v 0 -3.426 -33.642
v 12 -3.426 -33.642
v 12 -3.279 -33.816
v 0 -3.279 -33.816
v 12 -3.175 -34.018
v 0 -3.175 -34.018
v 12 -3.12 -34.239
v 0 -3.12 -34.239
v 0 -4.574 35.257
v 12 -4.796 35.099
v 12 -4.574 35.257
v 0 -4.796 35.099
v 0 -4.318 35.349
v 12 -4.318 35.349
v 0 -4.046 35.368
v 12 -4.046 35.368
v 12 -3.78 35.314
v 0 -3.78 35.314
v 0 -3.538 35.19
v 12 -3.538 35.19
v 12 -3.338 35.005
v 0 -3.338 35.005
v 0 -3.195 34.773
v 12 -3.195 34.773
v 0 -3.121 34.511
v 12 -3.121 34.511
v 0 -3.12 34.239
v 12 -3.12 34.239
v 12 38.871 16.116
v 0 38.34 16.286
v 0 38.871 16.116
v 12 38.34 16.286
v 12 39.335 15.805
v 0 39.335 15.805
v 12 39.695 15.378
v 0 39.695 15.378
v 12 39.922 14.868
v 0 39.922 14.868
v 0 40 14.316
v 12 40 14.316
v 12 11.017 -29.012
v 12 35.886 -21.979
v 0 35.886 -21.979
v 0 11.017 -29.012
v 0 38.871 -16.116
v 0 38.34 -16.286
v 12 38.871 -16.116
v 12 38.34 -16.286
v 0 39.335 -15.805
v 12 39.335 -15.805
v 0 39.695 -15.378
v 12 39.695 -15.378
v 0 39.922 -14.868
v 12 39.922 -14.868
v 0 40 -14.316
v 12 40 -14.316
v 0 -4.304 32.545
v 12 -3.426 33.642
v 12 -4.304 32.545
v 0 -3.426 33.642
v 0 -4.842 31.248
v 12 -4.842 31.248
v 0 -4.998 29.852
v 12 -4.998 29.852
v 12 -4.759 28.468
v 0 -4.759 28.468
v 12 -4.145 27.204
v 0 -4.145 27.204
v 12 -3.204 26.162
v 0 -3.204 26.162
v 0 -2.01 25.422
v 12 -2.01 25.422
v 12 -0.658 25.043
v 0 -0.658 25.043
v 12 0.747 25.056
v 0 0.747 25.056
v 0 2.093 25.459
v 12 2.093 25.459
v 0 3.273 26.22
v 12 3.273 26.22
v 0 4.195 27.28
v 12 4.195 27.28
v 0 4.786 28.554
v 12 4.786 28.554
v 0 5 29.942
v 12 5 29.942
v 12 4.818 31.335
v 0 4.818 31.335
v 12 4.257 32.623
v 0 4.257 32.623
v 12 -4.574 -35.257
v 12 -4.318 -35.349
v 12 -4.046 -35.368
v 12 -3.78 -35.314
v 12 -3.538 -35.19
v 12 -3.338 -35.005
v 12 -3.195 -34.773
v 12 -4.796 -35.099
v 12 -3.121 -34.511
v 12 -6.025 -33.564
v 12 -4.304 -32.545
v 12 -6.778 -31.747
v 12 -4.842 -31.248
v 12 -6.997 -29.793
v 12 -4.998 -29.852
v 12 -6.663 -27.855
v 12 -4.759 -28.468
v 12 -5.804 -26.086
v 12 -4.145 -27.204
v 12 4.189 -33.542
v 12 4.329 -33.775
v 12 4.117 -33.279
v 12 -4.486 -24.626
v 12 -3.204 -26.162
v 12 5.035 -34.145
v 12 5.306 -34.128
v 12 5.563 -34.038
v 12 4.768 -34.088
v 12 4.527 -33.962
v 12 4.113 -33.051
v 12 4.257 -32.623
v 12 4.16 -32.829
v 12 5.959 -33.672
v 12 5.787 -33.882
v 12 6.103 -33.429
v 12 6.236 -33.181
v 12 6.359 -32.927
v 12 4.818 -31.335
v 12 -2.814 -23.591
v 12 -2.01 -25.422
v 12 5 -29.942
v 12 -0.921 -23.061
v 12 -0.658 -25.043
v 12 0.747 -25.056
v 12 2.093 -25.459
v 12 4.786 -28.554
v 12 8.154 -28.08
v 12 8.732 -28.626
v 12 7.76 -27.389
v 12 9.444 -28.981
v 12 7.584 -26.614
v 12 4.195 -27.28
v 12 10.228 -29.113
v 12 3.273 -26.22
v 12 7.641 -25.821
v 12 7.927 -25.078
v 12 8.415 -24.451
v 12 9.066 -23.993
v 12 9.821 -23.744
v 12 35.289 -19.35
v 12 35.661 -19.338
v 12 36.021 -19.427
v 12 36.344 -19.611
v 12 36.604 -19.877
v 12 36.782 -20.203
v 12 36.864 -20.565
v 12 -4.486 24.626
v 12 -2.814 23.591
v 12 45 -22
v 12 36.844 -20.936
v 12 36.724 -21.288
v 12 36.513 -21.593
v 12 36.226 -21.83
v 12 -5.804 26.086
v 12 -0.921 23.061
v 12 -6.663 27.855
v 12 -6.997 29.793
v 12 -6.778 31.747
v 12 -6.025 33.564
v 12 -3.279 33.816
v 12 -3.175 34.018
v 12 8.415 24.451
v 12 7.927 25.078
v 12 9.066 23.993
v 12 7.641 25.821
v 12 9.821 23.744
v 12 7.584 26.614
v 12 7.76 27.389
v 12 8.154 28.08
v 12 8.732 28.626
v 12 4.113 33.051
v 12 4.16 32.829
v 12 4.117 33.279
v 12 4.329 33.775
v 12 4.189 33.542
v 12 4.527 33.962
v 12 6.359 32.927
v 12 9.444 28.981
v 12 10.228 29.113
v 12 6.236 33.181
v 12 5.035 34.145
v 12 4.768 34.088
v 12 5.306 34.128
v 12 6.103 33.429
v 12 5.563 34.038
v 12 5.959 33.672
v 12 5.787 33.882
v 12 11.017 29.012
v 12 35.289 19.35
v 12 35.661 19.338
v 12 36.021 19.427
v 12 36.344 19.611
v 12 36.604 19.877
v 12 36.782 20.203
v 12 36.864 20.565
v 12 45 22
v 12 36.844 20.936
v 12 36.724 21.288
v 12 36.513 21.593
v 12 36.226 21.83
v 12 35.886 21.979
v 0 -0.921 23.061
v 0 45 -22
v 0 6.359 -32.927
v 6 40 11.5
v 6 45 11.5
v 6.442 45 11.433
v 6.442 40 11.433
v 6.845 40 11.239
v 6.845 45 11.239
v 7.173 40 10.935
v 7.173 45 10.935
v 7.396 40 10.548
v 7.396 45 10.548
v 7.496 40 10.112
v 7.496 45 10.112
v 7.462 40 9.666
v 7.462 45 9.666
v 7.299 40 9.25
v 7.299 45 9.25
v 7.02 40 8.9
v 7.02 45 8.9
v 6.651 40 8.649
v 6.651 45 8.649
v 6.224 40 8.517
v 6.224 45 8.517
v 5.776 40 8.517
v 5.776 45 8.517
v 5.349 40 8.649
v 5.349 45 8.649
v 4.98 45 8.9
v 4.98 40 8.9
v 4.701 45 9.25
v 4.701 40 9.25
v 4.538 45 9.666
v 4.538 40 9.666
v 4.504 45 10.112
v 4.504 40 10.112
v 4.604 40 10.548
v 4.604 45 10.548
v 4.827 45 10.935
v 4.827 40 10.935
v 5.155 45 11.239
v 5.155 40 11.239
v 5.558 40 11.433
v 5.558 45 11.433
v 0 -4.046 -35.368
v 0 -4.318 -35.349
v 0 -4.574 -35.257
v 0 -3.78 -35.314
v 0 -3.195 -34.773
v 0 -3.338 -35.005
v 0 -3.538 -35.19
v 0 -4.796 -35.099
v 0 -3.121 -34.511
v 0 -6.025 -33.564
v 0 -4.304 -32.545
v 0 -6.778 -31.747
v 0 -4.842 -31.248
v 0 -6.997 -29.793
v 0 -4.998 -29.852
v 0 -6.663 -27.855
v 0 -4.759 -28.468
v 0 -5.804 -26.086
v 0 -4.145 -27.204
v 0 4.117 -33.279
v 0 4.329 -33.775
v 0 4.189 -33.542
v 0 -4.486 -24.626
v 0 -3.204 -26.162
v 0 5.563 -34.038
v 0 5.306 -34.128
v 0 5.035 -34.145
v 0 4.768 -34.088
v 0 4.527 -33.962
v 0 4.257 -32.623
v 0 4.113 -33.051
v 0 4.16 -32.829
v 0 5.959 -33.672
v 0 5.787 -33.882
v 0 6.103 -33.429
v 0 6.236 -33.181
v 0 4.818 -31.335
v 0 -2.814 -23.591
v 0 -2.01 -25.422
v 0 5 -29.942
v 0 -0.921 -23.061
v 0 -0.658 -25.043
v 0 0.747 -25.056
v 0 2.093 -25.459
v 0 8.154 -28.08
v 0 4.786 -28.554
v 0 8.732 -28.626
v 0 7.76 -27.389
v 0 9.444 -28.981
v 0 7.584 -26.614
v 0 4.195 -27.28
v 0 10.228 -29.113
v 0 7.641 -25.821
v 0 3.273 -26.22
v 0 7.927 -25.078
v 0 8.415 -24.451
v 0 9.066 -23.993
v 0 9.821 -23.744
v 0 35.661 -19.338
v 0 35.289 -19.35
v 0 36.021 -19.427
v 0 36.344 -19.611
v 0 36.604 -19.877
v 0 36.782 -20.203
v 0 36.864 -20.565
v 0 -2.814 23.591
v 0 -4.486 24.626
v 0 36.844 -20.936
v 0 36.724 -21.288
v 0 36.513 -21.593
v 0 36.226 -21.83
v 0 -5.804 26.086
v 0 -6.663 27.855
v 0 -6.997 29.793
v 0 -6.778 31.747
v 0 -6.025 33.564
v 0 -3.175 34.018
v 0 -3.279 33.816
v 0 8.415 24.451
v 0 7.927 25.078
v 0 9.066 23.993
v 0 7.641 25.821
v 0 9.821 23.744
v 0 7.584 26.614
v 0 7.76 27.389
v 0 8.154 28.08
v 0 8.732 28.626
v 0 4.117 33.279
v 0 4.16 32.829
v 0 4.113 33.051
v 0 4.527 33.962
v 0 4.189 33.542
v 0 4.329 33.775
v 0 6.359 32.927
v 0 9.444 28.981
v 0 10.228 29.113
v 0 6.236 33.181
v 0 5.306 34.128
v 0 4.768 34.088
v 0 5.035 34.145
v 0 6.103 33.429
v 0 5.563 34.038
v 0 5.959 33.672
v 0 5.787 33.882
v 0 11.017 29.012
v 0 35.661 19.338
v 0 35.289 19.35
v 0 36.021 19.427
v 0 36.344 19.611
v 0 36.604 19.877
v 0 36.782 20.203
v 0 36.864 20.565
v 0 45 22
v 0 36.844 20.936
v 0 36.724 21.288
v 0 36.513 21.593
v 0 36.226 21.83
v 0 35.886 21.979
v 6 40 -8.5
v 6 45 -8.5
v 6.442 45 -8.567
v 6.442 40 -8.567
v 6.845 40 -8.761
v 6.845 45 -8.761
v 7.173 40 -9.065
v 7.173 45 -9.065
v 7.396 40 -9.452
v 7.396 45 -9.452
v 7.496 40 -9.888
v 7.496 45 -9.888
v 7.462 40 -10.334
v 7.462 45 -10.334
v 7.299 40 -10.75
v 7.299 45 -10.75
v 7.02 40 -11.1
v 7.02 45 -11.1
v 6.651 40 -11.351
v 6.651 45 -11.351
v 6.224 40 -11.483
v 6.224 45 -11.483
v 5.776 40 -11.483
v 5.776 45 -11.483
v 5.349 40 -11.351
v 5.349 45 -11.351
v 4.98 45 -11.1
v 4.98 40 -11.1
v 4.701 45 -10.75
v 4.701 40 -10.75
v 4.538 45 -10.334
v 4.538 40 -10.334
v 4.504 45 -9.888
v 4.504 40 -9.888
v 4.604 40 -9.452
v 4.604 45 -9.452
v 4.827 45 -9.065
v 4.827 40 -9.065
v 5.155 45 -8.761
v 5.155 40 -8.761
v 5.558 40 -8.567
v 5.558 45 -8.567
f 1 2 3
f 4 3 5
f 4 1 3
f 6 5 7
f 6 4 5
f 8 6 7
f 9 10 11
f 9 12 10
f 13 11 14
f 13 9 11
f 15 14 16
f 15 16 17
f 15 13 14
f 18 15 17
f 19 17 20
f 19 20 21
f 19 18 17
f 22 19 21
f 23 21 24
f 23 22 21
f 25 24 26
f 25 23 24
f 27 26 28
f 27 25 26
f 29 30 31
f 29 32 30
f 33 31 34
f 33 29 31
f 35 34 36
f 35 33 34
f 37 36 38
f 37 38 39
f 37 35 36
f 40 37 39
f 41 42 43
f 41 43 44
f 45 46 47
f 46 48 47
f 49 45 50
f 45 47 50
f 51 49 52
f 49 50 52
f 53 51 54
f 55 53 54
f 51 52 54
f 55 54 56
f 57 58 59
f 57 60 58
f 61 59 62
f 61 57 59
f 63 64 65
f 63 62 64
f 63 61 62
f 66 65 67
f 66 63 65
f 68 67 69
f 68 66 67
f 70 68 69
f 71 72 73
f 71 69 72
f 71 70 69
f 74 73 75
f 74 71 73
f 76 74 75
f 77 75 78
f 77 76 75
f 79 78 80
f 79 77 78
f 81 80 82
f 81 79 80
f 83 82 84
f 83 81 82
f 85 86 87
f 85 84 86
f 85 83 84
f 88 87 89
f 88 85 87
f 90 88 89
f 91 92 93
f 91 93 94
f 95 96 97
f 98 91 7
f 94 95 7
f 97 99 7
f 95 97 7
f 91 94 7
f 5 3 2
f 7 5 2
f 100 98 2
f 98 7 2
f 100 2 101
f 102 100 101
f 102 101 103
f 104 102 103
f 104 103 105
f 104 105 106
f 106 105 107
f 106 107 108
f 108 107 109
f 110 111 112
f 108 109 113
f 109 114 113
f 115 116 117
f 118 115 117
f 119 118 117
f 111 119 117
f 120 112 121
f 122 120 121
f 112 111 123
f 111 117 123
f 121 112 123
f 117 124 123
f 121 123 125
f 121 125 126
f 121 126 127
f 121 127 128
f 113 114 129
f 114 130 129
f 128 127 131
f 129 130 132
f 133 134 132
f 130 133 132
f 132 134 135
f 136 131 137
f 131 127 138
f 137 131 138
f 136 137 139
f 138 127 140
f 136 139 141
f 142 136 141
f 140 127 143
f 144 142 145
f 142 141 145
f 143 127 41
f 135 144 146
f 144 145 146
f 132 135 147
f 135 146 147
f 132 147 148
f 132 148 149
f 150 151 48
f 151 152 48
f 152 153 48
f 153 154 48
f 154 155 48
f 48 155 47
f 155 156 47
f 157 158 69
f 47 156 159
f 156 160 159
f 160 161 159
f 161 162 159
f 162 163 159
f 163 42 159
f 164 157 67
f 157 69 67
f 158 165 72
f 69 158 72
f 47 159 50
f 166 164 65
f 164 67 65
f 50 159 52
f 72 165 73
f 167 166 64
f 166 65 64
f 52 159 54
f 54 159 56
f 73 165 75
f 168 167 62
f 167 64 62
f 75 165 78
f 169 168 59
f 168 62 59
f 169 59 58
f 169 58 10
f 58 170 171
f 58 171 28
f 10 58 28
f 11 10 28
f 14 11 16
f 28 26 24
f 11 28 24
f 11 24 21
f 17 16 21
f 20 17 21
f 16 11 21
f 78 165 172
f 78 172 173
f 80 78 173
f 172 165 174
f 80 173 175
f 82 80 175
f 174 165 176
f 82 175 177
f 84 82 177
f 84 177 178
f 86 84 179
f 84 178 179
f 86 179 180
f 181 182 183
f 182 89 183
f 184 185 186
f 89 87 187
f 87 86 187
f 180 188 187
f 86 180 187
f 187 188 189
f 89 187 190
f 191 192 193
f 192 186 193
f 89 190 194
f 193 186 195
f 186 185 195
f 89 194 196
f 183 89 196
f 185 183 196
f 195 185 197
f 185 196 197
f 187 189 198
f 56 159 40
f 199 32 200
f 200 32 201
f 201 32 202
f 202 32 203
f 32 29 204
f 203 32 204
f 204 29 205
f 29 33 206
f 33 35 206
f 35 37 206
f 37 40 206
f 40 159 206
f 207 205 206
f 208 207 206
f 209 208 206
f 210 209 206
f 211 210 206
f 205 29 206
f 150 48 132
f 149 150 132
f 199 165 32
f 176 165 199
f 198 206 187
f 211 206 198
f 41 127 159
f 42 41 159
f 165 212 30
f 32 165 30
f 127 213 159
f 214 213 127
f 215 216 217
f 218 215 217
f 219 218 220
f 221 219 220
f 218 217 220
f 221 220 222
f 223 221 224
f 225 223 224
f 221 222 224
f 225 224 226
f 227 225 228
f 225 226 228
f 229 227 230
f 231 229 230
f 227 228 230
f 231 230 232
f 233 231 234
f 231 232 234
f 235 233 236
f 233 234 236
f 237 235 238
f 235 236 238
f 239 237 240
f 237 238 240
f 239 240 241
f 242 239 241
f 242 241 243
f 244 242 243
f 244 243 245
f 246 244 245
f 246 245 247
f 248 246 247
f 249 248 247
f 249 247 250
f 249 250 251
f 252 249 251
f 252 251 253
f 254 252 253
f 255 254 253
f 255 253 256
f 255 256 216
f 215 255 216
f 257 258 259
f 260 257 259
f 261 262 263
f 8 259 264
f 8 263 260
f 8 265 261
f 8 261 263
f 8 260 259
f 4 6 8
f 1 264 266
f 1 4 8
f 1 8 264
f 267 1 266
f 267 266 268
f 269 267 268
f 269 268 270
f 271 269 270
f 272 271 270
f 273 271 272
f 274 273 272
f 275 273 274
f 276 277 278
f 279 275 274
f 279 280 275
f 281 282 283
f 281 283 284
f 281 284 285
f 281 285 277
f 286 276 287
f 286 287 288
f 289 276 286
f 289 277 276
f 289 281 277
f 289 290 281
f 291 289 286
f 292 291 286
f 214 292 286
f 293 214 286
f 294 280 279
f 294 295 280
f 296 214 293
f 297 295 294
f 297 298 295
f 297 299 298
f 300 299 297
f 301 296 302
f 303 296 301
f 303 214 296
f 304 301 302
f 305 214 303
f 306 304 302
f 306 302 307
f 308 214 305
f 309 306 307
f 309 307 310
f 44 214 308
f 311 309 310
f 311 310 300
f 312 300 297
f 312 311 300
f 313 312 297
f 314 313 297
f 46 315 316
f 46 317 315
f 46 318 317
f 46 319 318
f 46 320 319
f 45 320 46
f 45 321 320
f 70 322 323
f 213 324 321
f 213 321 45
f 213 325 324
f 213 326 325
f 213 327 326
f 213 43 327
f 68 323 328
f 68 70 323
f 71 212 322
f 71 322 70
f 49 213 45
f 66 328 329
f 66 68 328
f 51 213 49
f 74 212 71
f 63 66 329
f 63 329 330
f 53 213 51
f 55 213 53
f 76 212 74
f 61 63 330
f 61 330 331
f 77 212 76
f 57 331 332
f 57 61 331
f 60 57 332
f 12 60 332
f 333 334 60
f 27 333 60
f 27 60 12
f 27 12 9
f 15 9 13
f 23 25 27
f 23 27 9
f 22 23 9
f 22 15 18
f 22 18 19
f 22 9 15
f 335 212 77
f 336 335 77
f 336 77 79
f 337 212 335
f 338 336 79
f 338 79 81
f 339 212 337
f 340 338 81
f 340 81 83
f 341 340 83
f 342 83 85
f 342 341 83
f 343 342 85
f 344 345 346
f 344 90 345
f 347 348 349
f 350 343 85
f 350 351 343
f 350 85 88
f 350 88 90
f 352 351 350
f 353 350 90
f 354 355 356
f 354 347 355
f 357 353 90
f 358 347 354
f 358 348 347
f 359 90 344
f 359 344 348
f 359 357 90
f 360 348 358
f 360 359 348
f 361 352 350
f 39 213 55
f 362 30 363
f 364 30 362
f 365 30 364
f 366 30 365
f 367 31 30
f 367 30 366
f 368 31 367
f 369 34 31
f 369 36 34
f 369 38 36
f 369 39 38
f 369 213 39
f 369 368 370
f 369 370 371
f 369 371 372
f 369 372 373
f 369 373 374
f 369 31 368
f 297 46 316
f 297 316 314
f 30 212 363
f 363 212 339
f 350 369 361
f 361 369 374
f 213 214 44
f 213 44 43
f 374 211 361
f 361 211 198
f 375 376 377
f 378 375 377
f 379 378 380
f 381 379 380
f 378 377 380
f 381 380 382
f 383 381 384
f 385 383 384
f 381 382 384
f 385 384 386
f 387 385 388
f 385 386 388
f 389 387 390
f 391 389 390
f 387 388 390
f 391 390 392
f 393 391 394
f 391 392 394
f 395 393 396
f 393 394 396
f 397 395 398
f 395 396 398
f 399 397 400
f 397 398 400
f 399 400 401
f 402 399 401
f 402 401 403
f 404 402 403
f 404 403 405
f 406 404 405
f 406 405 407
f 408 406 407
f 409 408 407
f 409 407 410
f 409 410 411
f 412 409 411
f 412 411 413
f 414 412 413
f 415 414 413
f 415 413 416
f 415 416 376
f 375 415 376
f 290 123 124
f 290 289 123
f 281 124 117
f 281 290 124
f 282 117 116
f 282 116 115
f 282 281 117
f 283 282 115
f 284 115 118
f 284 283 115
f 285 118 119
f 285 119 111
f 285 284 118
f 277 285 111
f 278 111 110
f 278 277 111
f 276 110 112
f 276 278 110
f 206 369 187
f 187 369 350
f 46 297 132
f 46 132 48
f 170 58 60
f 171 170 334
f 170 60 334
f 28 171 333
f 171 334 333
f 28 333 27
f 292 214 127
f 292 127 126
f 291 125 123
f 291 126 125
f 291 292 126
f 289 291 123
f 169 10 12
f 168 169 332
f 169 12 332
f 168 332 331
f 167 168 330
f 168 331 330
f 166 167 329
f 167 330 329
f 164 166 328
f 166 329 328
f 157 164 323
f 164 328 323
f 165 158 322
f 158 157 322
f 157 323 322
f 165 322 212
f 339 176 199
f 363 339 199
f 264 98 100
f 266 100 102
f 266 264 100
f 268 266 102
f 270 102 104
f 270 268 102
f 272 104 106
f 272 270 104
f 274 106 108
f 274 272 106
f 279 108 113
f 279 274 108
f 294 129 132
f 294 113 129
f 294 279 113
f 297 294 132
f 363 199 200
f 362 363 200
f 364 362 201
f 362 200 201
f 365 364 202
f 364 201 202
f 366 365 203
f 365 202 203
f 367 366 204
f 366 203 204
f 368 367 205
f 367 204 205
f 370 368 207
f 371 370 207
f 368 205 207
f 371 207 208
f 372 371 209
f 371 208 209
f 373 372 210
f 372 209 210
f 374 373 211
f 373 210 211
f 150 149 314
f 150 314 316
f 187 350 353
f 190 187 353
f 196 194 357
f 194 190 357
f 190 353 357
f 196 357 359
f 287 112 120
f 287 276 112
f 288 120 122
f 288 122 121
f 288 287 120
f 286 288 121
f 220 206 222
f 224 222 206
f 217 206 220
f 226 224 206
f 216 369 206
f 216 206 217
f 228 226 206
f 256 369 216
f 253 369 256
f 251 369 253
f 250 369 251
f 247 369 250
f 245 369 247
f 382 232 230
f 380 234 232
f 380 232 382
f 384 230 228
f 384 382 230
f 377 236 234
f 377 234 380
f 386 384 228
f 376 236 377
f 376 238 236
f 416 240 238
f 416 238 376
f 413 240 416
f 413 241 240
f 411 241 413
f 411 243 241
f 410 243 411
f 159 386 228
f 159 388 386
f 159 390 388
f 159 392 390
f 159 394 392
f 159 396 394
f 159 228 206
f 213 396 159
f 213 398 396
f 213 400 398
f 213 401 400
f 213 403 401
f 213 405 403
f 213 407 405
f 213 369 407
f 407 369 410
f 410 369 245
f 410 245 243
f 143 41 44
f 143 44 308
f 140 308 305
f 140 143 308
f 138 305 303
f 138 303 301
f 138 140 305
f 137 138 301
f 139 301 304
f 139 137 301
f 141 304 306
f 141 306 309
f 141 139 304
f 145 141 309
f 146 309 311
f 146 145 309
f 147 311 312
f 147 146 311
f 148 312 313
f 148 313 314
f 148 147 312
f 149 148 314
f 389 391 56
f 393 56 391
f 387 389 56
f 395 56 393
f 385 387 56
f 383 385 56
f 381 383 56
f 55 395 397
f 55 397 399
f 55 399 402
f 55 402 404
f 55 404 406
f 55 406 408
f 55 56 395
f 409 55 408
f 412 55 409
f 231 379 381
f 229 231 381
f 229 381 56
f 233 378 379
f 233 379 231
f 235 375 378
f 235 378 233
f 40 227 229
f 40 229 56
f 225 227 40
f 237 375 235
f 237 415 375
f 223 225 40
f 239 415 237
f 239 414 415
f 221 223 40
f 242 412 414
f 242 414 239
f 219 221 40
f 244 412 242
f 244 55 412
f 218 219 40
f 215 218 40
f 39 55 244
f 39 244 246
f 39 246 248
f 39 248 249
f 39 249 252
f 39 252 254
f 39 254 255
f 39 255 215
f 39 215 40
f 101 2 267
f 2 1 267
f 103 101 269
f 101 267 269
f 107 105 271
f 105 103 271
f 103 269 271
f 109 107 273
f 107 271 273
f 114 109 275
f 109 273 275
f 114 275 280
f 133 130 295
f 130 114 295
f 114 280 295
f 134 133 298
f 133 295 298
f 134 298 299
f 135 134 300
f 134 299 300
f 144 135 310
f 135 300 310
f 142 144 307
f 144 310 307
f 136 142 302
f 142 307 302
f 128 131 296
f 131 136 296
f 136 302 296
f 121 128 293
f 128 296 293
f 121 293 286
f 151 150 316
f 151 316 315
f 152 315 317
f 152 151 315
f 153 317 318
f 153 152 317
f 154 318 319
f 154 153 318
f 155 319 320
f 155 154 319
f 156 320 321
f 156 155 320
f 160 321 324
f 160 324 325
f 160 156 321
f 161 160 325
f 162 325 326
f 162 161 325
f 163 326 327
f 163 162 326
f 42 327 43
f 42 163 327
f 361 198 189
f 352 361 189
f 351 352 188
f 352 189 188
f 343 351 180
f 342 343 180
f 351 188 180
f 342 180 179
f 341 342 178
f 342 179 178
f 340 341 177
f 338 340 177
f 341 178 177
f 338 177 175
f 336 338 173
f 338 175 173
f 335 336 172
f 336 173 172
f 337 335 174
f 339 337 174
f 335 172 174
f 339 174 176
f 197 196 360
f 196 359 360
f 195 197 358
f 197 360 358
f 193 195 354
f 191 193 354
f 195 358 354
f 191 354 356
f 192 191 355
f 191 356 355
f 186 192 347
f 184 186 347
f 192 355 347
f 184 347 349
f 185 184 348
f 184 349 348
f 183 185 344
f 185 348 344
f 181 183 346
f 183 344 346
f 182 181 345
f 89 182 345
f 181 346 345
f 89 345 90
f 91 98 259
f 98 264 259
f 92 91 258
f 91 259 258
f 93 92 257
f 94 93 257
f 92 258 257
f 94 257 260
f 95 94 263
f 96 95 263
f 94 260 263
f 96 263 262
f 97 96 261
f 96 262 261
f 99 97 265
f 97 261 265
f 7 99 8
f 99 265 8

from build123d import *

# Parameters (mm, degrees)
SKETCH1_R           = 7
SKETCH1_R_2         = 5
BOSS_EXTRUDE1_DEPTH = 12
CUT_EXTRUDE1_DEPTH  = 40.522145691
FILLET1_R           = 1
BOSS_EXTRUDE2_START = -12
BOSS_EXTRUDE2_DEPTH = 12
FILLET2_R           = 2
CUT_EXTRUDE2_DEPTH  = 59.481408086
SKETCH7_R           = 1.5
CUT_EXTRUDE3_DEPTH  = 65.024019647


with BuildPart() as part:
    # Sketch1 → Boss-Extrude1 (new body)
    with BuildSketch(Plane(origin=(0, 0, 0), x_dir=(0, 0, -1), z_dir=(1, 0, 0))):
        with Locations((-30, 0)):
            Circle(SKETCH1_R)
        with Locations((-30, 0)):
            Circle(SKETCH1_R_2, mode=Mode.SUBTRACT)
    extrude(amount=BOSS_EXTRUDE1_DEPTH)

    # Sketch3 → Cut-Extrude1 (cut, through all)
    with BuildSketch(Plane(origin=(12, 0, 0), x_dir=(0, 0, -1), z_dir=(1, 0, 0))):
        Polygon((-26.132418273, 3.168881756), (-27.092472621, -4.067712446), (-40.54775296, -2.282646151), (-39.587698612, 4.953948051), align=None)
    extrude(amount=-CUT_EXTRUDE1_DEPTH, mode=Mode.SUBTRACT)

    # Fillet1
    fillet1_edges = [part.edges().sort_by_distance(p)[0] for p in [
        (6, 4.067712446, 32.907527379),
        (6, 4.403840469, 35.441156966),
        (6, -3.168881756, 33.867581727),
        (6, -2.832753733, 36.401211314),
    ]]
    fillet(fillet1_edges, radius=FILLET1_R - 0.0001)  # a hair under: the kernel refuses the full size

    # Sketch4 → Boss-Extrude2 (add)
    with BuildSketch(Plane(origin=(12, 0, 0), x_dir=(0, 0, -1), z_dir=(1, 0, 0)).offset(BOSS_EXTRUDE2_START)):
        with BuildLine():
            Line((-23.06080008, -0.92060006), (-16, 40))
            Line((-16, 40), (0, 40))
            Line((0, 40), (0, 45))
            Line((0, 45), (-22, 45))
            Line((-22, 45), (-32.927058907, 6.358641848))
            ThreePointArc((-32.927058907, 6.358641848), (-25.844141537, 5.632835914), (-23.06080008, -0.92060006))
        make_face()
    extrude(amount=BOSS_EXTRUDE2_DEPTH)

    # Fillet2
    fillet2_edges = [part.edges().sort_by_distance(p)[0] for p in [
        (6, 40, 16),
    ]]
    fillet(fillet2_edges, radius=FILLET2_R)

    # Sketch6 → Cut-Extrude2 (cut, through all)
    with BuildSketch(Plane(origin=(12, 0, 0), x_dir=(0, 0, -1), z_dir=(1, 0, 0))):
        with BuildLine():
            Line((-23.744298761, 9.820968741), (-19.349752742, 35.289394134))
            ThreePointArc((-19.349752742, 35.289394134), (-20.381234985, 36.835447129), (-21.979152767, 35.886292641))
            Line((-21.979152767, 35.886292641), (-29.011800399, 11.016740989))
            ThreePointArc((-29.011800399, 11.016740989), (-27.008090108, 7.643460534), (-23.744298761, 9.820968741))
        make_face()
    extrude(amount=-CUT_EXTRUDE2_DEPTH, mode=Mode.SUBTRACT)

    # Mirror9: part across plane


with BuildPart() as part_1:
    add(part.part)
    add(part.part.mirror(Plane(origin=(-56.505687485, 40, 0), x_dir=(1, 0, 0), z_dir=(0, 0, -1))))

    # Sketch7 → Cut-Extrude3 (cut, through all)
    with BuildSketch(Plane(origin=(0, 45, 0), x_dir=(1, 0, 0), z_dir=(0, 1, 0))):
        with Locations(Location((6, -10, 0), (0, 0, 270))):
            Circle(SKETCH7_R)
        with Locations(Location((6, 10, 0), (0, 0, 270))):
            Circle(SKETCH7_R)
    extrude(amount=-CUT_EXTRUDE3_DEPTH, mode=Mode.SUBTRACT)


solid = part_1.part
